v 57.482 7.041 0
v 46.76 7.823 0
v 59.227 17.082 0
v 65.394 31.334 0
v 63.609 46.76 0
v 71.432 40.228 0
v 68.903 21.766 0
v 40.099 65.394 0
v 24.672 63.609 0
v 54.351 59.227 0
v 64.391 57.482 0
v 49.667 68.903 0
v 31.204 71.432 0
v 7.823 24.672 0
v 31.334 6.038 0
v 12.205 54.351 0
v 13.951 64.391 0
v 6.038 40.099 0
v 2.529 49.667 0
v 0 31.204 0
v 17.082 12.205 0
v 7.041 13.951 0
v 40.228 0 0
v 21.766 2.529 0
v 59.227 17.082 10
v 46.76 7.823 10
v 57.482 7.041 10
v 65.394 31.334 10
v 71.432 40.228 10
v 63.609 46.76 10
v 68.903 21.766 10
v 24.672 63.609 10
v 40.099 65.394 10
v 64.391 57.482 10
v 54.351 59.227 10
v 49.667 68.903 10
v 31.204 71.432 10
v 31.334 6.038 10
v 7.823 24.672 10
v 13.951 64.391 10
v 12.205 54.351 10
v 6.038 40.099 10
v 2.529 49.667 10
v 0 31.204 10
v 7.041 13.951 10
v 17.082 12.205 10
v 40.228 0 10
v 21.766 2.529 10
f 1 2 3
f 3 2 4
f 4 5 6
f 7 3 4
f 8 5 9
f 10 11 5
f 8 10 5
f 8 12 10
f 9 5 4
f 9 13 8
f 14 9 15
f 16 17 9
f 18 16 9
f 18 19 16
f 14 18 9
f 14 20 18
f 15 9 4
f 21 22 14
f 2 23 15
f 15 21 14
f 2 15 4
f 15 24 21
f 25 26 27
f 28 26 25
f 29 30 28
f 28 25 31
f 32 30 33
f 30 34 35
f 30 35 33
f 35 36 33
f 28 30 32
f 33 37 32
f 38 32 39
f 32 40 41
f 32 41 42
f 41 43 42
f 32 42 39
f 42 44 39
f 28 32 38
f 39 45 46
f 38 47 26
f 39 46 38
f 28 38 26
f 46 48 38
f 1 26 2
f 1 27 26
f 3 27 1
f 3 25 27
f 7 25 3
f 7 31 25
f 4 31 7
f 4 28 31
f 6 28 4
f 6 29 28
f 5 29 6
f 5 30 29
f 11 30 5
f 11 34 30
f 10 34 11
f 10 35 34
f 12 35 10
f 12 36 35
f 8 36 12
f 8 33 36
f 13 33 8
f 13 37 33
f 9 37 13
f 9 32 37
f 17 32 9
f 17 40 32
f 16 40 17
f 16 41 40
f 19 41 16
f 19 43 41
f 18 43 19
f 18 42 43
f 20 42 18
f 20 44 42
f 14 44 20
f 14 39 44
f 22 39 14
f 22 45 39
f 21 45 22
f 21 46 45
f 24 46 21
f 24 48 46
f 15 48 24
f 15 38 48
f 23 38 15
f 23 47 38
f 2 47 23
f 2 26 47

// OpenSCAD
$fn = 32;

// ----------------------------------------------------------------------
// Chain sprocket: 12 teeth, 30 mm root radius
// ----------------------------------------------------------------------

// --- parameters (mm) ---
profile_height = 10;      // extrusion height
profile_points = 24;      // points of the closed outline

profile = [[65.394, 31.334], [71.432, 40.228], [63.609, 46.76], [64.391, 57.482], [54.351, 59.227], [49.667, 68.903], [40.099, 65.394], [31.204, 71.432], [24.672, 63.609], [13.951, 64.391], [12.205, 54.351], [2.529, 49.667], [6.038, 40.099], [0, 31.204], [7.823, 24.672], [7.041, 13.951], [17.082, 12.205], [21.766, 2.529], [31.334, 6.038], [40.228, 0], [46.76, 7.823], [57.482, 7.041], [59.227, 17.082], [68.903, 21.766]];  // single closed polygon, 24 points, counter clockwise

// --- the one profile operation ---
linear_extrude(height = profile_height) polygon(points = profile);
